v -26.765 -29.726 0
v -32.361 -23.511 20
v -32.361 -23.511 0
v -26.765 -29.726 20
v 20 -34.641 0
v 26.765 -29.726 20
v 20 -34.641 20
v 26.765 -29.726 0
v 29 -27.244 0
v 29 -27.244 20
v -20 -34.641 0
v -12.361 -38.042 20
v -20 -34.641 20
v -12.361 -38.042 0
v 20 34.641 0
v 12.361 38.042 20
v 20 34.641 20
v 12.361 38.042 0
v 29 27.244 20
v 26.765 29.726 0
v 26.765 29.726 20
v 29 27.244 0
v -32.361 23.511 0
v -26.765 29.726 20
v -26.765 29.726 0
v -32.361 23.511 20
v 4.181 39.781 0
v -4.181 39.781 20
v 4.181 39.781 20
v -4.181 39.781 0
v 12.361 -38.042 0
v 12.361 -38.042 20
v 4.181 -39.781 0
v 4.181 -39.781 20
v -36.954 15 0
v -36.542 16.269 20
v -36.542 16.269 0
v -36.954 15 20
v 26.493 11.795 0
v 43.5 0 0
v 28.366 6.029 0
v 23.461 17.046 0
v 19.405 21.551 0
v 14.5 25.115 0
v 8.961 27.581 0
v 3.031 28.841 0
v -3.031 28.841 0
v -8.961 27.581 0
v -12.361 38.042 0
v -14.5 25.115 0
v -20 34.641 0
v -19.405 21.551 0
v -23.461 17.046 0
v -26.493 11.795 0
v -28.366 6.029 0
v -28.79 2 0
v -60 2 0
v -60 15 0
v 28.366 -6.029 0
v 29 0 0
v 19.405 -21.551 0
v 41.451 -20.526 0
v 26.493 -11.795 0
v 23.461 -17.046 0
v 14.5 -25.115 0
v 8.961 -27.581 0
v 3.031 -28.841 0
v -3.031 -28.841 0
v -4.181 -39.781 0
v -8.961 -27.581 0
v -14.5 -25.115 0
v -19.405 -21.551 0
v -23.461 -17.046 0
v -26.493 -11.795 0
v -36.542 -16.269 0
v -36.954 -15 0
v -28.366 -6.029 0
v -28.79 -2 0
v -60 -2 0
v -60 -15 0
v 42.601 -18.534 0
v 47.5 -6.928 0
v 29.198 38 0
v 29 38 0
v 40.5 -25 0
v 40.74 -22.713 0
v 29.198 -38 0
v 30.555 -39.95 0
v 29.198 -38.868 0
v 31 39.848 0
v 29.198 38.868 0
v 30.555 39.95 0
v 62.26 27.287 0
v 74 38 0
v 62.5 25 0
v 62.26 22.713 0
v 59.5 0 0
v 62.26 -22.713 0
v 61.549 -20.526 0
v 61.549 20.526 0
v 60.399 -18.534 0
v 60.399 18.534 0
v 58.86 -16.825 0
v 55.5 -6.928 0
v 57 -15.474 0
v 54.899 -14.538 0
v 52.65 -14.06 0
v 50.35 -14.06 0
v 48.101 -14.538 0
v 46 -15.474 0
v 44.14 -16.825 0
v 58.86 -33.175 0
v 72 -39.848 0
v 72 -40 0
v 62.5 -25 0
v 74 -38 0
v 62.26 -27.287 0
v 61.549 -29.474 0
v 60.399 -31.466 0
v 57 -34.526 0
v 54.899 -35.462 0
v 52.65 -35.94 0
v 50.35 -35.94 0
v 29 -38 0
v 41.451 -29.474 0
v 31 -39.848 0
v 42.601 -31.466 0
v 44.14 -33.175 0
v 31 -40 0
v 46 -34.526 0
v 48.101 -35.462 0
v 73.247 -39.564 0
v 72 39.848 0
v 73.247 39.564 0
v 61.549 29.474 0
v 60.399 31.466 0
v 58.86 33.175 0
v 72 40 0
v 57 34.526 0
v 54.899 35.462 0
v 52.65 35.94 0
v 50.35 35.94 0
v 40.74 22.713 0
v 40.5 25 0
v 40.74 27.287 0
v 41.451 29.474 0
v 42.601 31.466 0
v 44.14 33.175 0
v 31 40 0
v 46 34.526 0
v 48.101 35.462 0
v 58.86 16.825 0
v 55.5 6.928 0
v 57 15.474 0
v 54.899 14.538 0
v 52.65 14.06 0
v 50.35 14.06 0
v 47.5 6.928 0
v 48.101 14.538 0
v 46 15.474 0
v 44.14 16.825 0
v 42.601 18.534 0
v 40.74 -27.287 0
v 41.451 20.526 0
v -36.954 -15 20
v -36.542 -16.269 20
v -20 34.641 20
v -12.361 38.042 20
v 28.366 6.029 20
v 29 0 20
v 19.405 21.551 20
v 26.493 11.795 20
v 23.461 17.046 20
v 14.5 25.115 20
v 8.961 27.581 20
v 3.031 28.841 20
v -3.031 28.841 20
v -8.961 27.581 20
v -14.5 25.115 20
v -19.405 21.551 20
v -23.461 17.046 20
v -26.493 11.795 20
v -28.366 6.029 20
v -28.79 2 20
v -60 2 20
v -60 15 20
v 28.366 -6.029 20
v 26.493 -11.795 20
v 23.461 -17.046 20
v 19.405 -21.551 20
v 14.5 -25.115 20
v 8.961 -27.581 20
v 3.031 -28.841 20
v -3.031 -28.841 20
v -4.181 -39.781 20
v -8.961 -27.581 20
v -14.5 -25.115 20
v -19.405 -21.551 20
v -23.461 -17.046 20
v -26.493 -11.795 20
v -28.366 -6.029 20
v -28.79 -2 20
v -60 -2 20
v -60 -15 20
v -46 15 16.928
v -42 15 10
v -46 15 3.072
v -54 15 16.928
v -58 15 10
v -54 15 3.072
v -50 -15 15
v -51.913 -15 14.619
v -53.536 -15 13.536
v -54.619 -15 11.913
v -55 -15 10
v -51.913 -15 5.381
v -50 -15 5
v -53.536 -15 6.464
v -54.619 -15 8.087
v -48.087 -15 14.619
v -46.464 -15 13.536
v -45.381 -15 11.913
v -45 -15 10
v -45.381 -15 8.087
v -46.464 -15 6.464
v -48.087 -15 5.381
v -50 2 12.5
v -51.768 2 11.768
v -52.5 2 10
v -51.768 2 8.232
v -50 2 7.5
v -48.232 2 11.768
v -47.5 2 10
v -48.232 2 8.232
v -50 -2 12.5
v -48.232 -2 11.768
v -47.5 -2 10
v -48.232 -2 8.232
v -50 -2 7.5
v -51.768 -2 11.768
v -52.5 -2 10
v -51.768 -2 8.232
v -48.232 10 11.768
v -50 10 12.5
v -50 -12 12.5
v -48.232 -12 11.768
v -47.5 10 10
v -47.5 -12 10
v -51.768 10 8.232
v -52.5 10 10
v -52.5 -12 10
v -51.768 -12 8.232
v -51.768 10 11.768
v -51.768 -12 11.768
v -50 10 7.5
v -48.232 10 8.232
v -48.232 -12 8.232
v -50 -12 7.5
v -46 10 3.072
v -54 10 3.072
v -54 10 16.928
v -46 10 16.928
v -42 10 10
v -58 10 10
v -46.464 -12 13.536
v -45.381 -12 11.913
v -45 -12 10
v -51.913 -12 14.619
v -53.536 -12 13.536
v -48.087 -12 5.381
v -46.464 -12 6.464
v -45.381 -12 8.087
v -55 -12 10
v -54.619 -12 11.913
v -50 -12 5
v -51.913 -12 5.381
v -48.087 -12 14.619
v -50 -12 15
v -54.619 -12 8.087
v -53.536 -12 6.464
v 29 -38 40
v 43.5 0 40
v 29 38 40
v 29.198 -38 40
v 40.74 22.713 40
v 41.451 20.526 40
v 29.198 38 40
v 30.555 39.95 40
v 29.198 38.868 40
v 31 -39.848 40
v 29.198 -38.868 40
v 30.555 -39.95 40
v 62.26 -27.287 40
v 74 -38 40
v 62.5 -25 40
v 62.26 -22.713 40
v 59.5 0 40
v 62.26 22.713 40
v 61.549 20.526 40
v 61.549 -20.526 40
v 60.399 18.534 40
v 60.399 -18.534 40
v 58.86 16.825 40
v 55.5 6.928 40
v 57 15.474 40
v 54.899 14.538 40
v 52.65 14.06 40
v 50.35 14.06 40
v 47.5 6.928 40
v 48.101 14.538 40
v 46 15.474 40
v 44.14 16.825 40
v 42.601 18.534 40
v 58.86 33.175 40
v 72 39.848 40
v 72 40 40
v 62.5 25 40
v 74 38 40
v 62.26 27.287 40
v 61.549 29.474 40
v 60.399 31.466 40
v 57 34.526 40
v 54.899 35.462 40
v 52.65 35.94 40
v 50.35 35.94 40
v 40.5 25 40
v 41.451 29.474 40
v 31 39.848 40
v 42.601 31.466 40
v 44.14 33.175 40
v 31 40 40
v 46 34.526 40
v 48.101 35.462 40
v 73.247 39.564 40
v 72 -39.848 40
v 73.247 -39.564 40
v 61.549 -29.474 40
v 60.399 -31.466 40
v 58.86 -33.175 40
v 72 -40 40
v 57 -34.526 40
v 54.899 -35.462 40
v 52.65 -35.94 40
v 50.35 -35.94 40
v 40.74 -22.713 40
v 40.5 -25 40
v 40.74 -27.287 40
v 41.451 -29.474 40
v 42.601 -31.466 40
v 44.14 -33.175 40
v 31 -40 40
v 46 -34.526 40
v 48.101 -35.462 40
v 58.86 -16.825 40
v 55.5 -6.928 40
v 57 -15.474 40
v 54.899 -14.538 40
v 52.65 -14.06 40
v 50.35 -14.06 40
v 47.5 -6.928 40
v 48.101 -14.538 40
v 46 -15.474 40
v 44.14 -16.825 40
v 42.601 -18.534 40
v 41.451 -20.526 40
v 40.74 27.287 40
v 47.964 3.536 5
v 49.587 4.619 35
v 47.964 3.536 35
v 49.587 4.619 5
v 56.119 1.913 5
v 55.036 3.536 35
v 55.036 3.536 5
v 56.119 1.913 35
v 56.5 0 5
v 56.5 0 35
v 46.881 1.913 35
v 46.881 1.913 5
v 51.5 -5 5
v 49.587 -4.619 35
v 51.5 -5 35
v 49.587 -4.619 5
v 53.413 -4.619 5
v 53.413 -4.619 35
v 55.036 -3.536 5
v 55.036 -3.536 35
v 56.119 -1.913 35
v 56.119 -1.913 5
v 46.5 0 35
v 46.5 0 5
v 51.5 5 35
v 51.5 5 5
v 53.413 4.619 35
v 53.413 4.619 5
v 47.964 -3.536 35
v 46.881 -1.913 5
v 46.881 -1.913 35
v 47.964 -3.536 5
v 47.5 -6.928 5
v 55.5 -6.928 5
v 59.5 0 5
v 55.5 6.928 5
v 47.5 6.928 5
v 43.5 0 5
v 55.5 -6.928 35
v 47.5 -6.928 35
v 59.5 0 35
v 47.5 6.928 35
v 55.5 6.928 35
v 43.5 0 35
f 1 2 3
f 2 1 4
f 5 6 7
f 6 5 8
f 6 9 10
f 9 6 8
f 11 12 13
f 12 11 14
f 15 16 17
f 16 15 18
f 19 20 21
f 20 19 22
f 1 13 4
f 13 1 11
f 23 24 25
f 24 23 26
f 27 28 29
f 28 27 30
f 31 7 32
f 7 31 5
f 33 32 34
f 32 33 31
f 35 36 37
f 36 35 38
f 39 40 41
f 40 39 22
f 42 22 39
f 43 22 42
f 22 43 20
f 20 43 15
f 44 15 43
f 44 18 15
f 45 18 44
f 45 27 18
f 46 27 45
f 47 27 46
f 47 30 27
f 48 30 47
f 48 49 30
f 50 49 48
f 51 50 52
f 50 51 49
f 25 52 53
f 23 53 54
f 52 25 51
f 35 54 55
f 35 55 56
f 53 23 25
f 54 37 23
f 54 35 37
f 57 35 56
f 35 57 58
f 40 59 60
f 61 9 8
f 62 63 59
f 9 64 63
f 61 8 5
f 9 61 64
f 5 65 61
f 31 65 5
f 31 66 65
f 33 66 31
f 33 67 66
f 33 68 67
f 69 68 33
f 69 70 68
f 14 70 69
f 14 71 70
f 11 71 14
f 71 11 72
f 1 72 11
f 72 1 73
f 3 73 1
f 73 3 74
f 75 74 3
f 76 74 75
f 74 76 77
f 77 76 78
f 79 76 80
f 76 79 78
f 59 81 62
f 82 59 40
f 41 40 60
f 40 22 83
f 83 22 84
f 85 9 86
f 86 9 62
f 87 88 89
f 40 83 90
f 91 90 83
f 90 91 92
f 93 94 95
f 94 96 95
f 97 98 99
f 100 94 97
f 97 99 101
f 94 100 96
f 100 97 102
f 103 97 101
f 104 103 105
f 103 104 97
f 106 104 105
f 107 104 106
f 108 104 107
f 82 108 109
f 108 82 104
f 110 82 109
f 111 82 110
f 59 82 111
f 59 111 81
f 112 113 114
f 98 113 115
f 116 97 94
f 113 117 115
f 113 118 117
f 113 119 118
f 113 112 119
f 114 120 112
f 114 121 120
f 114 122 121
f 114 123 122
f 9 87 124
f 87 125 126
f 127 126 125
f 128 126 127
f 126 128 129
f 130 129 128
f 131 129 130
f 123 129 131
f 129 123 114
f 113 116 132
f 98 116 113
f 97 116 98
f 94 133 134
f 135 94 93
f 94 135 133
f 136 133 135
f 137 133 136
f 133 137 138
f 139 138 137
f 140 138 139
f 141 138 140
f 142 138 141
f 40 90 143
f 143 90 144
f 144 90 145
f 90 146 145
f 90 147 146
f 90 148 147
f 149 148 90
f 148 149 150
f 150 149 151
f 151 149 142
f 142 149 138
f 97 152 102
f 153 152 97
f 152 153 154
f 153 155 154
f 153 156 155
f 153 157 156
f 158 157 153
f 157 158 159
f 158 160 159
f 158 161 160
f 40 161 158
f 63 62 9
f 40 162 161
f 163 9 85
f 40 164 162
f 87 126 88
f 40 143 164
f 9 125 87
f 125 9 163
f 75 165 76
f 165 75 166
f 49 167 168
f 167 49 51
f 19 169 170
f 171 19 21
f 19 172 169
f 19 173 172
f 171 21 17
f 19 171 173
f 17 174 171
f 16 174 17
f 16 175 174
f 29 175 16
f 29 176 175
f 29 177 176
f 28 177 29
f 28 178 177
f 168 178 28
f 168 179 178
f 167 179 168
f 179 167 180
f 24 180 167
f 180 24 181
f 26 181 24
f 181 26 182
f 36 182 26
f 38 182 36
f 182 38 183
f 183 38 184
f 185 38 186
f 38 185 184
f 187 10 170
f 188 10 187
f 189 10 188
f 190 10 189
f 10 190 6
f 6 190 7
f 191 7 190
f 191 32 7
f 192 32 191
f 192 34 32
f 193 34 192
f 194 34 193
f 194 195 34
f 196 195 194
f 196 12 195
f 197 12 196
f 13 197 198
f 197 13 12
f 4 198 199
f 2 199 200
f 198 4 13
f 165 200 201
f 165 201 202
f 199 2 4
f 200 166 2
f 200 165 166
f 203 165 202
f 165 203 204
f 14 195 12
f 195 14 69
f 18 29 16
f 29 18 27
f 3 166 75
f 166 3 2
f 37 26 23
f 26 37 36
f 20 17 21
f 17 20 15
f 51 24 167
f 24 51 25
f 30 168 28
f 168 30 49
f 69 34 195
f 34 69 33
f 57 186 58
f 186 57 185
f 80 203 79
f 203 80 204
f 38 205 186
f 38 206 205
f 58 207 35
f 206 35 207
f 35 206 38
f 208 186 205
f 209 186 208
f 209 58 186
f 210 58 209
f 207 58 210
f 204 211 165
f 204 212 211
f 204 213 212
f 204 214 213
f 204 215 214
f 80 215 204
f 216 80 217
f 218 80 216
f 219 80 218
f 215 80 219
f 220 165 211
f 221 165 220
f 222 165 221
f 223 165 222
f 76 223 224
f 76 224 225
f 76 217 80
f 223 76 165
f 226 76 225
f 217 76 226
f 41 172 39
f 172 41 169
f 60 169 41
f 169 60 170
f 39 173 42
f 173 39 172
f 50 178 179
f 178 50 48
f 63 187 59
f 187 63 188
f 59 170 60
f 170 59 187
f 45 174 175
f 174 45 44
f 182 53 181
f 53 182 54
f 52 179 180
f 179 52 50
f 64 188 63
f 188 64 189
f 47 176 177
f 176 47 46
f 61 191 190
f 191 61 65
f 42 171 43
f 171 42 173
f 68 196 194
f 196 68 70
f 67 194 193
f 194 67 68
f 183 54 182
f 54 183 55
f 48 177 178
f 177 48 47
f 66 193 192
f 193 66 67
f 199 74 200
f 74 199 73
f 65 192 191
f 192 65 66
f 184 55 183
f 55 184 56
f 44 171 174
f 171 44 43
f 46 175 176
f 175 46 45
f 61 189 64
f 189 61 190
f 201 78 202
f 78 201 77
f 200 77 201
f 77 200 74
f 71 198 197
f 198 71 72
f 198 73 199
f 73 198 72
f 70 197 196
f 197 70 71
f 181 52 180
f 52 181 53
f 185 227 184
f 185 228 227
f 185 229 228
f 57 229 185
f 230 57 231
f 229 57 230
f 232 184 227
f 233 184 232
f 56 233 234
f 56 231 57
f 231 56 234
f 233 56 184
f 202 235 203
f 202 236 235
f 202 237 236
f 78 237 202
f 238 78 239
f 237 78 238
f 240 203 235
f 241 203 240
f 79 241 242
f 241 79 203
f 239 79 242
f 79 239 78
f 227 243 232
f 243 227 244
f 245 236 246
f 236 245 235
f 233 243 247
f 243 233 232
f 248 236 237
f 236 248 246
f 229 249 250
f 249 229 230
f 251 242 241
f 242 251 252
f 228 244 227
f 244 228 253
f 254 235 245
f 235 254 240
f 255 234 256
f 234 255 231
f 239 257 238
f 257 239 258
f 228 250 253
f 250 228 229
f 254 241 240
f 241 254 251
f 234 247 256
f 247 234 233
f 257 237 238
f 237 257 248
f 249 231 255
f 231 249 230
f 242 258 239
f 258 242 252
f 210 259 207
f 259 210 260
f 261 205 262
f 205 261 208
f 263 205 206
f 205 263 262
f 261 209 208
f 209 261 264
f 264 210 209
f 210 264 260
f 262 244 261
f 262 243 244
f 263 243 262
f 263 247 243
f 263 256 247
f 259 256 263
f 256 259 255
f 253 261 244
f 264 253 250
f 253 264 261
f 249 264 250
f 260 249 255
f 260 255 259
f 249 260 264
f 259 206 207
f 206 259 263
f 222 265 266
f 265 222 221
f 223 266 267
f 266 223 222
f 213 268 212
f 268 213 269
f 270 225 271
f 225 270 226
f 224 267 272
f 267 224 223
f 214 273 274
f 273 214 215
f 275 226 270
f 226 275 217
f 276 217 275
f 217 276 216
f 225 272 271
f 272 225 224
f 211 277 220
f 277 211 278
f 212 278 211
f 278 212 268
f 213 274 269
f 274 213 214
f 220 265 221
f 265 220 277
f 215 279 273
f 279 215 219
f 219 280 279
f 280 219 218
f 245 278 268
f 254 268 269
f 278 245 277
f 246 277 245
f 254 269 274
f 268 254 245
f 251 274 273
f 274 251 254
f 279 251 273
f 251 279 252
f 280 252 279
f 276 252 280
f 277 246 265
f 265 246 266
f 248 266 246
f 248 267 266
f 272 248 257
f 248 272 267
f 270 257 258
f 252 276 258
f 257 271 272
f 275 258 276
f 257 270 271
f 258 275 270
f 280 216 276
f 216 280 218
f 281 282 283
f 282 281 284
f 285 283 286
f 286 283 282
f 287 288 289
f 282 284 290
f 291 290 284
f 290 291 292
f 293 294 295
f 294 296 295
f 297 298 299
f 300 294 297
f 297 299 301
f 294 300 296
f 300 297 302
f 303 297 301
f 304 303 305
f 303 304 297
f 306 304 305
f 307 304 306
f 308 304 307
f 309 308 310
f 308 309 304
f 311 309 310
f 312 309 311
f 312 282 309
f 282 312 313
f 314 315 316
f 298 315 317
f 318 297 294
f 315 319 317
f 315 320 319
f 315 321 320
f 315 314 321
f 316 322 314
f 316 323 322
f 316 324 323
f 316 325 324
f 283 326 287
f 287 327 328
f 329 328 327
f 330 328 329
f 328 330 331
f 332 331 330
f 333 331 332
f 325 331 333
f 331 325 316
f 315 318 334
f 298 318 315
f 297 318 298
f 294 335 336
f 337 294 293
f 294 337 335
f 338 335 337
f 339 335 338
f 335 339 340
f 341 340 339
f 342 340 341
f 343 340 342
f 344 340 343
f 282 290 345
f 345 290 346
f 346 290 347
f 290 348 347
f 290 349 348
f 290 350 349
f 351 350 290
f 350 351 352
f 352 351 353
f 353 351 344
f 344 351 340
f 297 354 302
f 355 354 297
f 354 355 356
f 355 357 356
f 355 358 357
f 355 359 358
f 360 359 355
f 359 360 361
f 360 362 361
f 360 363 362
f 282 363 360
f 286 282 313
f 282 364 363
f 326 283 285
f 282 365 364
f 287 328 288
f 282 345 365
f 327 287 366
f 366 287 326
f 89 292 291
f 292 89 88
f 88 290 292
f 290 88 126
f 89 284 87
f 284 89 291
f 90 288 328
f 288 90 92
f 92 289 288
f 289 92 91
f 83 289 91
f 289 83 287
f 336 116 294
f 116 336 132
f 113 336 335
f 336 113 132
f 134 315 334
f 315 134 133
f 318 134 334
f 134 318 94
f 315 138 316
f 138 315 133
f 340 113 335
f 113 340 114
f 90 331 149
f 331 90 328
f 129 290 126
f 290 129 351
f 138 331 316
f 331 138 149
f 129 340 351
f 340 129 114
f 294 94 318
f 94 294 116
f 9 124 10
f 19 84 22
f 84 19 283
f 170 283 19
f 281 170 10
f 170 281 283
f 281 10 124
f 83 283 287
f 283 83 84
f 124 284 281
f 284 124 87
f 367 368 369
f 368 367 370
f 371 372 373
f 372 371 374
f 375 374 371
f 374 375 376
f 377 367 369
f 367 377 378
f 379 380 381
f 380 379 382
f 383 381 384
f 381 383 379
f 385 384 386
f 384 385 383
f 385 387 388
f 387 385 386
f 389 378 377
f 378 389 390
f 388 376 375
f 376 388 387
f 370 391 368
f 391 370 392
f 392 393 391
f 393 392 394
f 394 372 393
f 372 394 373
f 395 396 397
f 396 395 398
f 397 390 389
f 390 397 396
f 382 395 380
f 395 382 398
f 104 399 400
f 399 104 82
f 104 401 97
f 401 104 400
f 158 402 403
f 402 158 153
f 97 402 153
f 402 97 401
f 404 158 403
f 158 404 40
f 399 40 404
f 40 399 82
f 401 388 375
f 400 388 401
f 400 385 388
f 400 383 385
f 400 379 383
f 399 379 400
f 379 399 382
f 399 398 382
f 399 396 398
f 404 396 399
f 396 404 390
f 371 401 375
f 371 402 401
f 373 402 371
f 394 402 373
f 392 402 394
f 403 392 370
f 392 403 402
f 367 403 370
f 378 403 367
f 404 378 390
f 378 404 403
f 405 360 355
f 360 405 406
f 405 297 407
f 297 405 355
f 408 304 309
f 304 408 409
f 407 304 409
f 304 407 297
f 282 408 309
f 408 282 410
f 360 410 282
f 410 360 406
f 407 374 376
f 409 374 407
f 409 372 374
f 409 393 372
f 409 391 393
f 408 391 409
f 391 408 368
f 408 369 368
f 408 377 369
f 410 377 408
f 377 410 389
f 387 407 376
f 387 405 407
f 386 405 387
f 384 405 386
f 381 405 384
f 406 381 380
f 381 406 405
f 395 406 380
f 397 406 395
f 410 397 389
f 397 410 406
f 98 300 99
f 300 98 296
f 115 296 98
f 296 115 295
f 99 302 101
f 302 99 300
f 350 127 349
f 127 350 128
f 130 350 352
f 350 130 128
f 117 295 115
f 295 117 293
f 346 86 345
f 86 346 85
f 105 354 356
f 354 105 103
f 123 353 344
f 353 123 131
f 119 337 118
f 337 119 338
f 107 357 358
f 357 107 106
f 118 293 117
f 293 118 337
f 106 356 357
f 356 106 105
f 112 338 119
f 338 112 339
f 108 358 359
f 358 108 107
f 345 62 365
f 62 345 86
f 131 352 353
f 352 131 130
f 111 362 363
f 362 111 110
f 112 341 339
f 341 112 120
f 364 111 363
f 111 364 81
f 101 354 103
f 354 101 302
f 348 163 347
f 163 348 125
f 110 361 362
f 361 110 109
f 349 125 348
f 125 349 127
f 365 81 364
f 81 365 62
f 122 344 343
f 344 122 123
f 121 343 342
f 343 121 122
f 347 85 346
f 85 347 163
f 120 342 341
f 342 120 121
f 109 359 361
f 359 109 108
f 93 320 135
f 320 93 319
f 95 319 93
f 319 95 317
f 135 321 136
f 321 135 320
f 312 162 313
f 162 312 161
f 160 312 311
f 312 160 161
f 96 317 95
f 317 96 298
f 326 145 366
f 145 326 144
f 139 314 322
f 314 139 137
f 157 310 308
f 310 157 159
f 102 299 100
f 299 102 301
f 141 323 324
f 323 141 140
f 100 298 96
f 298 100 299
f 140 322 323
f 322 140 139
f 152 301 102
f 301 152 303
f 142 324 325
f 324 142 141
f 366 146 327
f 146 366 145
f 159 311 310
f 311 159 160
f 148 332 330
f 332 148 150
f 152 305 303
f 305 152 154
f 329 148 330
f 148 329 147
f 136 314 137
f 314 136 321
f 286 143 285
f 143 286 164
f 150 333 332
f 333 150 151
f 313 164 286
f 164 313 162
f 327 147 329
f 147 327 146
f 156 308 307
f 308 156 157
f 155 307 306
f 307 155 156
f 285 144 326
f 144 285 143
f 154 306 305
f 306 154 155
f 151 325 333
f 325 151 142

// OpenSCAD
use <MCAD/boxes.scad>

height=20;
inner=29;
outer=40;

rod_dia=11;
rod_dist=25;
hndl_w=45;

screw_dia=6;

holder_width=30;
holder_len=40;

screw_head=8;
screw_head_sink=5;
screw_fit_dia=10;
screw_fit_sink=3;
screw_dia=5;


/* M4 screw: 8-9 mm actual */

difference() {
	union() {
	cylinder(height,outer,outer);
	 translate([-outer,0,height/2]) 
		    cube([holder_len, holder_width ,height], center=true);
	}


	cylinder(height,inner,inner);
	translate([-outer,0,height/2])  cube([(outer-inner)*5,4,height], center=true);

      translate([-outer-holder_len/4,0,height/2])  rotate([90,0,0])  {
           cylinder(holder_width*2,screw_dia/2,screw_dia/2, center=true); 	
	 }

      translate([-outer-holder_len/4,holder_width/2,height/2])  rotate([90,0,0])  {
          cylinder(screw_head_sink*2,screw_head,screw_head,$fn=6,center=true);
}


      translate([-outer-holder_len/4,-holder_width/2,height/2])  rotate([90,0,0])  {
           cylinder(screw_fit_sink*2,screw_fit_dia/2,screw_fit_dia/2, center=true); 	
	 }
//   
//	   cylinder(holder_width*2,screw_dia,screw_dia); 
	 //  
	
}



translate([inner,-outer,0]) 
 difference() {
      translate([hndl_w/2,outer,height])  roundedBox([hndl_w,outer*2, height*2], 2, true);	
	/* Two rods for directing */

      translate([hndl_w/2,outer-rod_dist,0])  { 
	cylinder(height*2,rod_dia,rod_dia);
	}

      translate([hndl_w/2,outer+rod_dist,0])  cylinder(height*2,rod_dia,rod_dia);

	/* Transmission stuff */
      translate([hndl_w/2,outer,0])  {
	cylinder(height*2,screw_dia,screw_dia); 
	cylinder(screw_head_sink*2,screw_head,screw_head,$fn=6,center=true);
	translate([0,0,height*2]) cylinder(screw_head_sink*2,screw_head,screw_head,$fn=6,center=true);

}

	
}
